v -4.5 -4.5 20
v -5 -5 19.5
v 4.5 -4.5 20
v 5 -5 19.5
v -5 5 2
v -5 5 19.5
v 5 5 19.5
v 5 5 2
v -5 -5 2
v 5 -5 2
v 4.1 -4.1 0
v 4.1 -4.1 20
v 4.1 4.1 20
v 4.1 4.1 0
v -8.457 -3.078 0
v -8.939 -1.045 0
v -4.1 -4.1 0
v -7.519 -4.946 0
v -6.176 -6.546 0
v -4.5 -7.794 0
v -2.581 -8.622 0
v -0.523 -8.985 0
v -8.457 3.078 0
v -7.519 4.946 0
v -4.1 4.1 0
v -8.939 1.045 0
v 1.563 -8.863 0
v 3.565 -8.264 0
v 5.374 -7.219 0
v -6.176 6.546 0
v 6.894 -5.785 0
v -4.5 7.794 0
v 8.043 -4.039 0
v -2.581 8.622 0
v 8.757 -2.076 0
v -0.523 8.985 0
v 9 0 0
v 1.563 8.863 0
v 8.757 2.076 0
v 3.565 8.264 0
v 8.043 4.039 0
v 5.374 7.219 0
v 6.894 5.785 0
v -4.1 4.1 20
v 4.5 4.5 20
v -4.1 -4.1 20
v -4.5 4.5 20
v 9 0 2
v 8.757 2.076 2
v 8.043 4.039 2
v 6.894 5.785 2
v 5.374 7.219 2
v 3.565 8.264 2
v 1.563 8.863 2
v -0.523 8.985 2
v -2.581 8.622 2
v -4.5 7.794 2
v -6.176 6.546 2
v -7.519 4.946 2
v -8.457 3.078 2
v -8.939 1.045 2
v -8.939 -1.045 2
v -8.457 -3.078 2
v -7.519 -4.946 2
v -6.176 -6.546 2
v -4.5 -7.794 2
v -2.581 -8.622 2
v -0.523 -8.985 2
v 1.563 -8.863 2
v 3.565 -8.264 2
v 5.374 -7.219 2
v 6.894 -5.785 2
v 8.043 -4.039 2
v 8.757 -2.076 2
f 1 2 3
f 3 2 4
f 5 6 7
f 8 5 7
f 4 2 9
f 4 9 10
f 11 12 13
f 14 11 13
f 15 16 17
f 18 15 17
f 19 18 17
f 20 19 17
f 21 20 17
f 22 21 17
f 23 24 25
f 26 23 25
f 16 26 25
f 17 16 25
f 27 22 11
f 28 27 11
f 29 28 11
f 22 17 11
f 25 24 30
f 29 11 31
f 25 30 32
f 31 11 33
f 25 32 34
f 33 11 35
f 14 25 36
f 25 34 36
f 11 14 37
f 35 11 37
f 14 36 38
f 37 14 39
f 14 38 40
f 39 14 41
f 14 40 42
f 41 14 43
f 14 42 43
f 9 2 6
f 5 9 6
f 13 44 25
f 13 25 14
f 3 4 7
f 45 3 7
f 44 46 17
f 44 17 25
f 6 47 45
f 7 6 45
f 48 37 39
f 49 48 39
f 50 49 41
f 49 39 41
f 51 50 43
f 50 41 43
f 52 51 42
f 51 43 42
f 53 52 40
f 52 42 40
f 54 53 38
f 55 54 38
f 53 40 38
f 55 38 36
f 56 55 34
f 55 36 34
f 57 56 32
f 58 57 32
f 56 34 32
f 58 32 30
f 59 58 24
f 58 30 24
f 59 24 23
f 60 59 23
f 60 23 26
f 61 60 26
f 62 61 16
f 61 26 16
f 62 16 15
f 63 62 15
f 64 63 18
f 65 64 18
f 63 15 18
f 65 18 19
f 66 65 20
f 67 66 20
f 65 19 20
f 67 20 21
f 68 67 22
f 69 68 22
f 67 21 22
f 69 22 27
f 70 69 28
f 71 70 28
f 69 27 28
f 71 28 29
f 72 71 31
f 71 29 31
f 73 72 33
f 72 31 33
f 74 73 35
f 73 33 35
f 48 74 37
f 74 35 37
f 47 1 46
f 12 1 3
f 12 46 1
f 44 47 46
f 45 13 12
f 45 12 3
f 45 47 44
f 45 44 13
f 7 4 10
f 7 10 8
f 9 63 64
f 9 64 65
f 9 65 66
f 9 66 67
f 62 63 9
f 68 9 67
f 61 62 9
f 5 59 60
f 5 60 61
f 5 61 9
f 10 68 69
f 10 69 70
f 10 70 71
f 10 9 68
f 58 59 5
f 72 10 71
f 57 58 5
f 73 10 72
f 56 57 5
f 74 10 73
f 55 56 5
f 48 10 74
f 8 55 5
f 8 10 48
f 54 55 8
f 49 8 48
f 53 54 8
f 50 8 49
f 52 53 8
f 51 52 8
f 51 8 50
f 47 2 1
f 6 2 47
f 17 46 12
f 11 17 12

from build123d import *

# Parameters (mm, degrees)
F0_R     = 9
F0_W     = 10
F0_H     = 10
F0_W_2   = 8.2
F0_H_2   = 8.2
F1_DEPTH = 2
F2_DEPTH = 20
F3_SIZE  = 0.5


with BuildPart() as f1:
    # F0 (on Top) → F1 (new body)
    with BuildSketch(Plane.XY):
        Circle(F0_R)
        Rectangle(F0_W, F0_H, mode=Mode.SUBTRACT)
        Rectangle(F0_W, F0_H)
        Rectangle(F0_W_2, F0_H_2, mode=Mode.SUBTRACT)
    extrude(amount=F1_DEPTH)

    # F0 (on Top) → F2 (join)
    with BuildSketch(Plane.XY):
        Rectangle(F0_W, F0_H)
        Rectangle(F0_W_2, F0_H_2, mode=Mode.SUBTRACT)
    extrude(amount=F2_DEPTH)

    # F3
    f3_edges = [f1.edges().sort_by_distance(p)[0] for p in [
        (0, -5, 20),
        (5, 0, 20),
        (0, 5, 20),
        (-5, 0, 20),
    ]]
    chamfer(f3_edges, length=F3_SIZE)


solid = f1.part
